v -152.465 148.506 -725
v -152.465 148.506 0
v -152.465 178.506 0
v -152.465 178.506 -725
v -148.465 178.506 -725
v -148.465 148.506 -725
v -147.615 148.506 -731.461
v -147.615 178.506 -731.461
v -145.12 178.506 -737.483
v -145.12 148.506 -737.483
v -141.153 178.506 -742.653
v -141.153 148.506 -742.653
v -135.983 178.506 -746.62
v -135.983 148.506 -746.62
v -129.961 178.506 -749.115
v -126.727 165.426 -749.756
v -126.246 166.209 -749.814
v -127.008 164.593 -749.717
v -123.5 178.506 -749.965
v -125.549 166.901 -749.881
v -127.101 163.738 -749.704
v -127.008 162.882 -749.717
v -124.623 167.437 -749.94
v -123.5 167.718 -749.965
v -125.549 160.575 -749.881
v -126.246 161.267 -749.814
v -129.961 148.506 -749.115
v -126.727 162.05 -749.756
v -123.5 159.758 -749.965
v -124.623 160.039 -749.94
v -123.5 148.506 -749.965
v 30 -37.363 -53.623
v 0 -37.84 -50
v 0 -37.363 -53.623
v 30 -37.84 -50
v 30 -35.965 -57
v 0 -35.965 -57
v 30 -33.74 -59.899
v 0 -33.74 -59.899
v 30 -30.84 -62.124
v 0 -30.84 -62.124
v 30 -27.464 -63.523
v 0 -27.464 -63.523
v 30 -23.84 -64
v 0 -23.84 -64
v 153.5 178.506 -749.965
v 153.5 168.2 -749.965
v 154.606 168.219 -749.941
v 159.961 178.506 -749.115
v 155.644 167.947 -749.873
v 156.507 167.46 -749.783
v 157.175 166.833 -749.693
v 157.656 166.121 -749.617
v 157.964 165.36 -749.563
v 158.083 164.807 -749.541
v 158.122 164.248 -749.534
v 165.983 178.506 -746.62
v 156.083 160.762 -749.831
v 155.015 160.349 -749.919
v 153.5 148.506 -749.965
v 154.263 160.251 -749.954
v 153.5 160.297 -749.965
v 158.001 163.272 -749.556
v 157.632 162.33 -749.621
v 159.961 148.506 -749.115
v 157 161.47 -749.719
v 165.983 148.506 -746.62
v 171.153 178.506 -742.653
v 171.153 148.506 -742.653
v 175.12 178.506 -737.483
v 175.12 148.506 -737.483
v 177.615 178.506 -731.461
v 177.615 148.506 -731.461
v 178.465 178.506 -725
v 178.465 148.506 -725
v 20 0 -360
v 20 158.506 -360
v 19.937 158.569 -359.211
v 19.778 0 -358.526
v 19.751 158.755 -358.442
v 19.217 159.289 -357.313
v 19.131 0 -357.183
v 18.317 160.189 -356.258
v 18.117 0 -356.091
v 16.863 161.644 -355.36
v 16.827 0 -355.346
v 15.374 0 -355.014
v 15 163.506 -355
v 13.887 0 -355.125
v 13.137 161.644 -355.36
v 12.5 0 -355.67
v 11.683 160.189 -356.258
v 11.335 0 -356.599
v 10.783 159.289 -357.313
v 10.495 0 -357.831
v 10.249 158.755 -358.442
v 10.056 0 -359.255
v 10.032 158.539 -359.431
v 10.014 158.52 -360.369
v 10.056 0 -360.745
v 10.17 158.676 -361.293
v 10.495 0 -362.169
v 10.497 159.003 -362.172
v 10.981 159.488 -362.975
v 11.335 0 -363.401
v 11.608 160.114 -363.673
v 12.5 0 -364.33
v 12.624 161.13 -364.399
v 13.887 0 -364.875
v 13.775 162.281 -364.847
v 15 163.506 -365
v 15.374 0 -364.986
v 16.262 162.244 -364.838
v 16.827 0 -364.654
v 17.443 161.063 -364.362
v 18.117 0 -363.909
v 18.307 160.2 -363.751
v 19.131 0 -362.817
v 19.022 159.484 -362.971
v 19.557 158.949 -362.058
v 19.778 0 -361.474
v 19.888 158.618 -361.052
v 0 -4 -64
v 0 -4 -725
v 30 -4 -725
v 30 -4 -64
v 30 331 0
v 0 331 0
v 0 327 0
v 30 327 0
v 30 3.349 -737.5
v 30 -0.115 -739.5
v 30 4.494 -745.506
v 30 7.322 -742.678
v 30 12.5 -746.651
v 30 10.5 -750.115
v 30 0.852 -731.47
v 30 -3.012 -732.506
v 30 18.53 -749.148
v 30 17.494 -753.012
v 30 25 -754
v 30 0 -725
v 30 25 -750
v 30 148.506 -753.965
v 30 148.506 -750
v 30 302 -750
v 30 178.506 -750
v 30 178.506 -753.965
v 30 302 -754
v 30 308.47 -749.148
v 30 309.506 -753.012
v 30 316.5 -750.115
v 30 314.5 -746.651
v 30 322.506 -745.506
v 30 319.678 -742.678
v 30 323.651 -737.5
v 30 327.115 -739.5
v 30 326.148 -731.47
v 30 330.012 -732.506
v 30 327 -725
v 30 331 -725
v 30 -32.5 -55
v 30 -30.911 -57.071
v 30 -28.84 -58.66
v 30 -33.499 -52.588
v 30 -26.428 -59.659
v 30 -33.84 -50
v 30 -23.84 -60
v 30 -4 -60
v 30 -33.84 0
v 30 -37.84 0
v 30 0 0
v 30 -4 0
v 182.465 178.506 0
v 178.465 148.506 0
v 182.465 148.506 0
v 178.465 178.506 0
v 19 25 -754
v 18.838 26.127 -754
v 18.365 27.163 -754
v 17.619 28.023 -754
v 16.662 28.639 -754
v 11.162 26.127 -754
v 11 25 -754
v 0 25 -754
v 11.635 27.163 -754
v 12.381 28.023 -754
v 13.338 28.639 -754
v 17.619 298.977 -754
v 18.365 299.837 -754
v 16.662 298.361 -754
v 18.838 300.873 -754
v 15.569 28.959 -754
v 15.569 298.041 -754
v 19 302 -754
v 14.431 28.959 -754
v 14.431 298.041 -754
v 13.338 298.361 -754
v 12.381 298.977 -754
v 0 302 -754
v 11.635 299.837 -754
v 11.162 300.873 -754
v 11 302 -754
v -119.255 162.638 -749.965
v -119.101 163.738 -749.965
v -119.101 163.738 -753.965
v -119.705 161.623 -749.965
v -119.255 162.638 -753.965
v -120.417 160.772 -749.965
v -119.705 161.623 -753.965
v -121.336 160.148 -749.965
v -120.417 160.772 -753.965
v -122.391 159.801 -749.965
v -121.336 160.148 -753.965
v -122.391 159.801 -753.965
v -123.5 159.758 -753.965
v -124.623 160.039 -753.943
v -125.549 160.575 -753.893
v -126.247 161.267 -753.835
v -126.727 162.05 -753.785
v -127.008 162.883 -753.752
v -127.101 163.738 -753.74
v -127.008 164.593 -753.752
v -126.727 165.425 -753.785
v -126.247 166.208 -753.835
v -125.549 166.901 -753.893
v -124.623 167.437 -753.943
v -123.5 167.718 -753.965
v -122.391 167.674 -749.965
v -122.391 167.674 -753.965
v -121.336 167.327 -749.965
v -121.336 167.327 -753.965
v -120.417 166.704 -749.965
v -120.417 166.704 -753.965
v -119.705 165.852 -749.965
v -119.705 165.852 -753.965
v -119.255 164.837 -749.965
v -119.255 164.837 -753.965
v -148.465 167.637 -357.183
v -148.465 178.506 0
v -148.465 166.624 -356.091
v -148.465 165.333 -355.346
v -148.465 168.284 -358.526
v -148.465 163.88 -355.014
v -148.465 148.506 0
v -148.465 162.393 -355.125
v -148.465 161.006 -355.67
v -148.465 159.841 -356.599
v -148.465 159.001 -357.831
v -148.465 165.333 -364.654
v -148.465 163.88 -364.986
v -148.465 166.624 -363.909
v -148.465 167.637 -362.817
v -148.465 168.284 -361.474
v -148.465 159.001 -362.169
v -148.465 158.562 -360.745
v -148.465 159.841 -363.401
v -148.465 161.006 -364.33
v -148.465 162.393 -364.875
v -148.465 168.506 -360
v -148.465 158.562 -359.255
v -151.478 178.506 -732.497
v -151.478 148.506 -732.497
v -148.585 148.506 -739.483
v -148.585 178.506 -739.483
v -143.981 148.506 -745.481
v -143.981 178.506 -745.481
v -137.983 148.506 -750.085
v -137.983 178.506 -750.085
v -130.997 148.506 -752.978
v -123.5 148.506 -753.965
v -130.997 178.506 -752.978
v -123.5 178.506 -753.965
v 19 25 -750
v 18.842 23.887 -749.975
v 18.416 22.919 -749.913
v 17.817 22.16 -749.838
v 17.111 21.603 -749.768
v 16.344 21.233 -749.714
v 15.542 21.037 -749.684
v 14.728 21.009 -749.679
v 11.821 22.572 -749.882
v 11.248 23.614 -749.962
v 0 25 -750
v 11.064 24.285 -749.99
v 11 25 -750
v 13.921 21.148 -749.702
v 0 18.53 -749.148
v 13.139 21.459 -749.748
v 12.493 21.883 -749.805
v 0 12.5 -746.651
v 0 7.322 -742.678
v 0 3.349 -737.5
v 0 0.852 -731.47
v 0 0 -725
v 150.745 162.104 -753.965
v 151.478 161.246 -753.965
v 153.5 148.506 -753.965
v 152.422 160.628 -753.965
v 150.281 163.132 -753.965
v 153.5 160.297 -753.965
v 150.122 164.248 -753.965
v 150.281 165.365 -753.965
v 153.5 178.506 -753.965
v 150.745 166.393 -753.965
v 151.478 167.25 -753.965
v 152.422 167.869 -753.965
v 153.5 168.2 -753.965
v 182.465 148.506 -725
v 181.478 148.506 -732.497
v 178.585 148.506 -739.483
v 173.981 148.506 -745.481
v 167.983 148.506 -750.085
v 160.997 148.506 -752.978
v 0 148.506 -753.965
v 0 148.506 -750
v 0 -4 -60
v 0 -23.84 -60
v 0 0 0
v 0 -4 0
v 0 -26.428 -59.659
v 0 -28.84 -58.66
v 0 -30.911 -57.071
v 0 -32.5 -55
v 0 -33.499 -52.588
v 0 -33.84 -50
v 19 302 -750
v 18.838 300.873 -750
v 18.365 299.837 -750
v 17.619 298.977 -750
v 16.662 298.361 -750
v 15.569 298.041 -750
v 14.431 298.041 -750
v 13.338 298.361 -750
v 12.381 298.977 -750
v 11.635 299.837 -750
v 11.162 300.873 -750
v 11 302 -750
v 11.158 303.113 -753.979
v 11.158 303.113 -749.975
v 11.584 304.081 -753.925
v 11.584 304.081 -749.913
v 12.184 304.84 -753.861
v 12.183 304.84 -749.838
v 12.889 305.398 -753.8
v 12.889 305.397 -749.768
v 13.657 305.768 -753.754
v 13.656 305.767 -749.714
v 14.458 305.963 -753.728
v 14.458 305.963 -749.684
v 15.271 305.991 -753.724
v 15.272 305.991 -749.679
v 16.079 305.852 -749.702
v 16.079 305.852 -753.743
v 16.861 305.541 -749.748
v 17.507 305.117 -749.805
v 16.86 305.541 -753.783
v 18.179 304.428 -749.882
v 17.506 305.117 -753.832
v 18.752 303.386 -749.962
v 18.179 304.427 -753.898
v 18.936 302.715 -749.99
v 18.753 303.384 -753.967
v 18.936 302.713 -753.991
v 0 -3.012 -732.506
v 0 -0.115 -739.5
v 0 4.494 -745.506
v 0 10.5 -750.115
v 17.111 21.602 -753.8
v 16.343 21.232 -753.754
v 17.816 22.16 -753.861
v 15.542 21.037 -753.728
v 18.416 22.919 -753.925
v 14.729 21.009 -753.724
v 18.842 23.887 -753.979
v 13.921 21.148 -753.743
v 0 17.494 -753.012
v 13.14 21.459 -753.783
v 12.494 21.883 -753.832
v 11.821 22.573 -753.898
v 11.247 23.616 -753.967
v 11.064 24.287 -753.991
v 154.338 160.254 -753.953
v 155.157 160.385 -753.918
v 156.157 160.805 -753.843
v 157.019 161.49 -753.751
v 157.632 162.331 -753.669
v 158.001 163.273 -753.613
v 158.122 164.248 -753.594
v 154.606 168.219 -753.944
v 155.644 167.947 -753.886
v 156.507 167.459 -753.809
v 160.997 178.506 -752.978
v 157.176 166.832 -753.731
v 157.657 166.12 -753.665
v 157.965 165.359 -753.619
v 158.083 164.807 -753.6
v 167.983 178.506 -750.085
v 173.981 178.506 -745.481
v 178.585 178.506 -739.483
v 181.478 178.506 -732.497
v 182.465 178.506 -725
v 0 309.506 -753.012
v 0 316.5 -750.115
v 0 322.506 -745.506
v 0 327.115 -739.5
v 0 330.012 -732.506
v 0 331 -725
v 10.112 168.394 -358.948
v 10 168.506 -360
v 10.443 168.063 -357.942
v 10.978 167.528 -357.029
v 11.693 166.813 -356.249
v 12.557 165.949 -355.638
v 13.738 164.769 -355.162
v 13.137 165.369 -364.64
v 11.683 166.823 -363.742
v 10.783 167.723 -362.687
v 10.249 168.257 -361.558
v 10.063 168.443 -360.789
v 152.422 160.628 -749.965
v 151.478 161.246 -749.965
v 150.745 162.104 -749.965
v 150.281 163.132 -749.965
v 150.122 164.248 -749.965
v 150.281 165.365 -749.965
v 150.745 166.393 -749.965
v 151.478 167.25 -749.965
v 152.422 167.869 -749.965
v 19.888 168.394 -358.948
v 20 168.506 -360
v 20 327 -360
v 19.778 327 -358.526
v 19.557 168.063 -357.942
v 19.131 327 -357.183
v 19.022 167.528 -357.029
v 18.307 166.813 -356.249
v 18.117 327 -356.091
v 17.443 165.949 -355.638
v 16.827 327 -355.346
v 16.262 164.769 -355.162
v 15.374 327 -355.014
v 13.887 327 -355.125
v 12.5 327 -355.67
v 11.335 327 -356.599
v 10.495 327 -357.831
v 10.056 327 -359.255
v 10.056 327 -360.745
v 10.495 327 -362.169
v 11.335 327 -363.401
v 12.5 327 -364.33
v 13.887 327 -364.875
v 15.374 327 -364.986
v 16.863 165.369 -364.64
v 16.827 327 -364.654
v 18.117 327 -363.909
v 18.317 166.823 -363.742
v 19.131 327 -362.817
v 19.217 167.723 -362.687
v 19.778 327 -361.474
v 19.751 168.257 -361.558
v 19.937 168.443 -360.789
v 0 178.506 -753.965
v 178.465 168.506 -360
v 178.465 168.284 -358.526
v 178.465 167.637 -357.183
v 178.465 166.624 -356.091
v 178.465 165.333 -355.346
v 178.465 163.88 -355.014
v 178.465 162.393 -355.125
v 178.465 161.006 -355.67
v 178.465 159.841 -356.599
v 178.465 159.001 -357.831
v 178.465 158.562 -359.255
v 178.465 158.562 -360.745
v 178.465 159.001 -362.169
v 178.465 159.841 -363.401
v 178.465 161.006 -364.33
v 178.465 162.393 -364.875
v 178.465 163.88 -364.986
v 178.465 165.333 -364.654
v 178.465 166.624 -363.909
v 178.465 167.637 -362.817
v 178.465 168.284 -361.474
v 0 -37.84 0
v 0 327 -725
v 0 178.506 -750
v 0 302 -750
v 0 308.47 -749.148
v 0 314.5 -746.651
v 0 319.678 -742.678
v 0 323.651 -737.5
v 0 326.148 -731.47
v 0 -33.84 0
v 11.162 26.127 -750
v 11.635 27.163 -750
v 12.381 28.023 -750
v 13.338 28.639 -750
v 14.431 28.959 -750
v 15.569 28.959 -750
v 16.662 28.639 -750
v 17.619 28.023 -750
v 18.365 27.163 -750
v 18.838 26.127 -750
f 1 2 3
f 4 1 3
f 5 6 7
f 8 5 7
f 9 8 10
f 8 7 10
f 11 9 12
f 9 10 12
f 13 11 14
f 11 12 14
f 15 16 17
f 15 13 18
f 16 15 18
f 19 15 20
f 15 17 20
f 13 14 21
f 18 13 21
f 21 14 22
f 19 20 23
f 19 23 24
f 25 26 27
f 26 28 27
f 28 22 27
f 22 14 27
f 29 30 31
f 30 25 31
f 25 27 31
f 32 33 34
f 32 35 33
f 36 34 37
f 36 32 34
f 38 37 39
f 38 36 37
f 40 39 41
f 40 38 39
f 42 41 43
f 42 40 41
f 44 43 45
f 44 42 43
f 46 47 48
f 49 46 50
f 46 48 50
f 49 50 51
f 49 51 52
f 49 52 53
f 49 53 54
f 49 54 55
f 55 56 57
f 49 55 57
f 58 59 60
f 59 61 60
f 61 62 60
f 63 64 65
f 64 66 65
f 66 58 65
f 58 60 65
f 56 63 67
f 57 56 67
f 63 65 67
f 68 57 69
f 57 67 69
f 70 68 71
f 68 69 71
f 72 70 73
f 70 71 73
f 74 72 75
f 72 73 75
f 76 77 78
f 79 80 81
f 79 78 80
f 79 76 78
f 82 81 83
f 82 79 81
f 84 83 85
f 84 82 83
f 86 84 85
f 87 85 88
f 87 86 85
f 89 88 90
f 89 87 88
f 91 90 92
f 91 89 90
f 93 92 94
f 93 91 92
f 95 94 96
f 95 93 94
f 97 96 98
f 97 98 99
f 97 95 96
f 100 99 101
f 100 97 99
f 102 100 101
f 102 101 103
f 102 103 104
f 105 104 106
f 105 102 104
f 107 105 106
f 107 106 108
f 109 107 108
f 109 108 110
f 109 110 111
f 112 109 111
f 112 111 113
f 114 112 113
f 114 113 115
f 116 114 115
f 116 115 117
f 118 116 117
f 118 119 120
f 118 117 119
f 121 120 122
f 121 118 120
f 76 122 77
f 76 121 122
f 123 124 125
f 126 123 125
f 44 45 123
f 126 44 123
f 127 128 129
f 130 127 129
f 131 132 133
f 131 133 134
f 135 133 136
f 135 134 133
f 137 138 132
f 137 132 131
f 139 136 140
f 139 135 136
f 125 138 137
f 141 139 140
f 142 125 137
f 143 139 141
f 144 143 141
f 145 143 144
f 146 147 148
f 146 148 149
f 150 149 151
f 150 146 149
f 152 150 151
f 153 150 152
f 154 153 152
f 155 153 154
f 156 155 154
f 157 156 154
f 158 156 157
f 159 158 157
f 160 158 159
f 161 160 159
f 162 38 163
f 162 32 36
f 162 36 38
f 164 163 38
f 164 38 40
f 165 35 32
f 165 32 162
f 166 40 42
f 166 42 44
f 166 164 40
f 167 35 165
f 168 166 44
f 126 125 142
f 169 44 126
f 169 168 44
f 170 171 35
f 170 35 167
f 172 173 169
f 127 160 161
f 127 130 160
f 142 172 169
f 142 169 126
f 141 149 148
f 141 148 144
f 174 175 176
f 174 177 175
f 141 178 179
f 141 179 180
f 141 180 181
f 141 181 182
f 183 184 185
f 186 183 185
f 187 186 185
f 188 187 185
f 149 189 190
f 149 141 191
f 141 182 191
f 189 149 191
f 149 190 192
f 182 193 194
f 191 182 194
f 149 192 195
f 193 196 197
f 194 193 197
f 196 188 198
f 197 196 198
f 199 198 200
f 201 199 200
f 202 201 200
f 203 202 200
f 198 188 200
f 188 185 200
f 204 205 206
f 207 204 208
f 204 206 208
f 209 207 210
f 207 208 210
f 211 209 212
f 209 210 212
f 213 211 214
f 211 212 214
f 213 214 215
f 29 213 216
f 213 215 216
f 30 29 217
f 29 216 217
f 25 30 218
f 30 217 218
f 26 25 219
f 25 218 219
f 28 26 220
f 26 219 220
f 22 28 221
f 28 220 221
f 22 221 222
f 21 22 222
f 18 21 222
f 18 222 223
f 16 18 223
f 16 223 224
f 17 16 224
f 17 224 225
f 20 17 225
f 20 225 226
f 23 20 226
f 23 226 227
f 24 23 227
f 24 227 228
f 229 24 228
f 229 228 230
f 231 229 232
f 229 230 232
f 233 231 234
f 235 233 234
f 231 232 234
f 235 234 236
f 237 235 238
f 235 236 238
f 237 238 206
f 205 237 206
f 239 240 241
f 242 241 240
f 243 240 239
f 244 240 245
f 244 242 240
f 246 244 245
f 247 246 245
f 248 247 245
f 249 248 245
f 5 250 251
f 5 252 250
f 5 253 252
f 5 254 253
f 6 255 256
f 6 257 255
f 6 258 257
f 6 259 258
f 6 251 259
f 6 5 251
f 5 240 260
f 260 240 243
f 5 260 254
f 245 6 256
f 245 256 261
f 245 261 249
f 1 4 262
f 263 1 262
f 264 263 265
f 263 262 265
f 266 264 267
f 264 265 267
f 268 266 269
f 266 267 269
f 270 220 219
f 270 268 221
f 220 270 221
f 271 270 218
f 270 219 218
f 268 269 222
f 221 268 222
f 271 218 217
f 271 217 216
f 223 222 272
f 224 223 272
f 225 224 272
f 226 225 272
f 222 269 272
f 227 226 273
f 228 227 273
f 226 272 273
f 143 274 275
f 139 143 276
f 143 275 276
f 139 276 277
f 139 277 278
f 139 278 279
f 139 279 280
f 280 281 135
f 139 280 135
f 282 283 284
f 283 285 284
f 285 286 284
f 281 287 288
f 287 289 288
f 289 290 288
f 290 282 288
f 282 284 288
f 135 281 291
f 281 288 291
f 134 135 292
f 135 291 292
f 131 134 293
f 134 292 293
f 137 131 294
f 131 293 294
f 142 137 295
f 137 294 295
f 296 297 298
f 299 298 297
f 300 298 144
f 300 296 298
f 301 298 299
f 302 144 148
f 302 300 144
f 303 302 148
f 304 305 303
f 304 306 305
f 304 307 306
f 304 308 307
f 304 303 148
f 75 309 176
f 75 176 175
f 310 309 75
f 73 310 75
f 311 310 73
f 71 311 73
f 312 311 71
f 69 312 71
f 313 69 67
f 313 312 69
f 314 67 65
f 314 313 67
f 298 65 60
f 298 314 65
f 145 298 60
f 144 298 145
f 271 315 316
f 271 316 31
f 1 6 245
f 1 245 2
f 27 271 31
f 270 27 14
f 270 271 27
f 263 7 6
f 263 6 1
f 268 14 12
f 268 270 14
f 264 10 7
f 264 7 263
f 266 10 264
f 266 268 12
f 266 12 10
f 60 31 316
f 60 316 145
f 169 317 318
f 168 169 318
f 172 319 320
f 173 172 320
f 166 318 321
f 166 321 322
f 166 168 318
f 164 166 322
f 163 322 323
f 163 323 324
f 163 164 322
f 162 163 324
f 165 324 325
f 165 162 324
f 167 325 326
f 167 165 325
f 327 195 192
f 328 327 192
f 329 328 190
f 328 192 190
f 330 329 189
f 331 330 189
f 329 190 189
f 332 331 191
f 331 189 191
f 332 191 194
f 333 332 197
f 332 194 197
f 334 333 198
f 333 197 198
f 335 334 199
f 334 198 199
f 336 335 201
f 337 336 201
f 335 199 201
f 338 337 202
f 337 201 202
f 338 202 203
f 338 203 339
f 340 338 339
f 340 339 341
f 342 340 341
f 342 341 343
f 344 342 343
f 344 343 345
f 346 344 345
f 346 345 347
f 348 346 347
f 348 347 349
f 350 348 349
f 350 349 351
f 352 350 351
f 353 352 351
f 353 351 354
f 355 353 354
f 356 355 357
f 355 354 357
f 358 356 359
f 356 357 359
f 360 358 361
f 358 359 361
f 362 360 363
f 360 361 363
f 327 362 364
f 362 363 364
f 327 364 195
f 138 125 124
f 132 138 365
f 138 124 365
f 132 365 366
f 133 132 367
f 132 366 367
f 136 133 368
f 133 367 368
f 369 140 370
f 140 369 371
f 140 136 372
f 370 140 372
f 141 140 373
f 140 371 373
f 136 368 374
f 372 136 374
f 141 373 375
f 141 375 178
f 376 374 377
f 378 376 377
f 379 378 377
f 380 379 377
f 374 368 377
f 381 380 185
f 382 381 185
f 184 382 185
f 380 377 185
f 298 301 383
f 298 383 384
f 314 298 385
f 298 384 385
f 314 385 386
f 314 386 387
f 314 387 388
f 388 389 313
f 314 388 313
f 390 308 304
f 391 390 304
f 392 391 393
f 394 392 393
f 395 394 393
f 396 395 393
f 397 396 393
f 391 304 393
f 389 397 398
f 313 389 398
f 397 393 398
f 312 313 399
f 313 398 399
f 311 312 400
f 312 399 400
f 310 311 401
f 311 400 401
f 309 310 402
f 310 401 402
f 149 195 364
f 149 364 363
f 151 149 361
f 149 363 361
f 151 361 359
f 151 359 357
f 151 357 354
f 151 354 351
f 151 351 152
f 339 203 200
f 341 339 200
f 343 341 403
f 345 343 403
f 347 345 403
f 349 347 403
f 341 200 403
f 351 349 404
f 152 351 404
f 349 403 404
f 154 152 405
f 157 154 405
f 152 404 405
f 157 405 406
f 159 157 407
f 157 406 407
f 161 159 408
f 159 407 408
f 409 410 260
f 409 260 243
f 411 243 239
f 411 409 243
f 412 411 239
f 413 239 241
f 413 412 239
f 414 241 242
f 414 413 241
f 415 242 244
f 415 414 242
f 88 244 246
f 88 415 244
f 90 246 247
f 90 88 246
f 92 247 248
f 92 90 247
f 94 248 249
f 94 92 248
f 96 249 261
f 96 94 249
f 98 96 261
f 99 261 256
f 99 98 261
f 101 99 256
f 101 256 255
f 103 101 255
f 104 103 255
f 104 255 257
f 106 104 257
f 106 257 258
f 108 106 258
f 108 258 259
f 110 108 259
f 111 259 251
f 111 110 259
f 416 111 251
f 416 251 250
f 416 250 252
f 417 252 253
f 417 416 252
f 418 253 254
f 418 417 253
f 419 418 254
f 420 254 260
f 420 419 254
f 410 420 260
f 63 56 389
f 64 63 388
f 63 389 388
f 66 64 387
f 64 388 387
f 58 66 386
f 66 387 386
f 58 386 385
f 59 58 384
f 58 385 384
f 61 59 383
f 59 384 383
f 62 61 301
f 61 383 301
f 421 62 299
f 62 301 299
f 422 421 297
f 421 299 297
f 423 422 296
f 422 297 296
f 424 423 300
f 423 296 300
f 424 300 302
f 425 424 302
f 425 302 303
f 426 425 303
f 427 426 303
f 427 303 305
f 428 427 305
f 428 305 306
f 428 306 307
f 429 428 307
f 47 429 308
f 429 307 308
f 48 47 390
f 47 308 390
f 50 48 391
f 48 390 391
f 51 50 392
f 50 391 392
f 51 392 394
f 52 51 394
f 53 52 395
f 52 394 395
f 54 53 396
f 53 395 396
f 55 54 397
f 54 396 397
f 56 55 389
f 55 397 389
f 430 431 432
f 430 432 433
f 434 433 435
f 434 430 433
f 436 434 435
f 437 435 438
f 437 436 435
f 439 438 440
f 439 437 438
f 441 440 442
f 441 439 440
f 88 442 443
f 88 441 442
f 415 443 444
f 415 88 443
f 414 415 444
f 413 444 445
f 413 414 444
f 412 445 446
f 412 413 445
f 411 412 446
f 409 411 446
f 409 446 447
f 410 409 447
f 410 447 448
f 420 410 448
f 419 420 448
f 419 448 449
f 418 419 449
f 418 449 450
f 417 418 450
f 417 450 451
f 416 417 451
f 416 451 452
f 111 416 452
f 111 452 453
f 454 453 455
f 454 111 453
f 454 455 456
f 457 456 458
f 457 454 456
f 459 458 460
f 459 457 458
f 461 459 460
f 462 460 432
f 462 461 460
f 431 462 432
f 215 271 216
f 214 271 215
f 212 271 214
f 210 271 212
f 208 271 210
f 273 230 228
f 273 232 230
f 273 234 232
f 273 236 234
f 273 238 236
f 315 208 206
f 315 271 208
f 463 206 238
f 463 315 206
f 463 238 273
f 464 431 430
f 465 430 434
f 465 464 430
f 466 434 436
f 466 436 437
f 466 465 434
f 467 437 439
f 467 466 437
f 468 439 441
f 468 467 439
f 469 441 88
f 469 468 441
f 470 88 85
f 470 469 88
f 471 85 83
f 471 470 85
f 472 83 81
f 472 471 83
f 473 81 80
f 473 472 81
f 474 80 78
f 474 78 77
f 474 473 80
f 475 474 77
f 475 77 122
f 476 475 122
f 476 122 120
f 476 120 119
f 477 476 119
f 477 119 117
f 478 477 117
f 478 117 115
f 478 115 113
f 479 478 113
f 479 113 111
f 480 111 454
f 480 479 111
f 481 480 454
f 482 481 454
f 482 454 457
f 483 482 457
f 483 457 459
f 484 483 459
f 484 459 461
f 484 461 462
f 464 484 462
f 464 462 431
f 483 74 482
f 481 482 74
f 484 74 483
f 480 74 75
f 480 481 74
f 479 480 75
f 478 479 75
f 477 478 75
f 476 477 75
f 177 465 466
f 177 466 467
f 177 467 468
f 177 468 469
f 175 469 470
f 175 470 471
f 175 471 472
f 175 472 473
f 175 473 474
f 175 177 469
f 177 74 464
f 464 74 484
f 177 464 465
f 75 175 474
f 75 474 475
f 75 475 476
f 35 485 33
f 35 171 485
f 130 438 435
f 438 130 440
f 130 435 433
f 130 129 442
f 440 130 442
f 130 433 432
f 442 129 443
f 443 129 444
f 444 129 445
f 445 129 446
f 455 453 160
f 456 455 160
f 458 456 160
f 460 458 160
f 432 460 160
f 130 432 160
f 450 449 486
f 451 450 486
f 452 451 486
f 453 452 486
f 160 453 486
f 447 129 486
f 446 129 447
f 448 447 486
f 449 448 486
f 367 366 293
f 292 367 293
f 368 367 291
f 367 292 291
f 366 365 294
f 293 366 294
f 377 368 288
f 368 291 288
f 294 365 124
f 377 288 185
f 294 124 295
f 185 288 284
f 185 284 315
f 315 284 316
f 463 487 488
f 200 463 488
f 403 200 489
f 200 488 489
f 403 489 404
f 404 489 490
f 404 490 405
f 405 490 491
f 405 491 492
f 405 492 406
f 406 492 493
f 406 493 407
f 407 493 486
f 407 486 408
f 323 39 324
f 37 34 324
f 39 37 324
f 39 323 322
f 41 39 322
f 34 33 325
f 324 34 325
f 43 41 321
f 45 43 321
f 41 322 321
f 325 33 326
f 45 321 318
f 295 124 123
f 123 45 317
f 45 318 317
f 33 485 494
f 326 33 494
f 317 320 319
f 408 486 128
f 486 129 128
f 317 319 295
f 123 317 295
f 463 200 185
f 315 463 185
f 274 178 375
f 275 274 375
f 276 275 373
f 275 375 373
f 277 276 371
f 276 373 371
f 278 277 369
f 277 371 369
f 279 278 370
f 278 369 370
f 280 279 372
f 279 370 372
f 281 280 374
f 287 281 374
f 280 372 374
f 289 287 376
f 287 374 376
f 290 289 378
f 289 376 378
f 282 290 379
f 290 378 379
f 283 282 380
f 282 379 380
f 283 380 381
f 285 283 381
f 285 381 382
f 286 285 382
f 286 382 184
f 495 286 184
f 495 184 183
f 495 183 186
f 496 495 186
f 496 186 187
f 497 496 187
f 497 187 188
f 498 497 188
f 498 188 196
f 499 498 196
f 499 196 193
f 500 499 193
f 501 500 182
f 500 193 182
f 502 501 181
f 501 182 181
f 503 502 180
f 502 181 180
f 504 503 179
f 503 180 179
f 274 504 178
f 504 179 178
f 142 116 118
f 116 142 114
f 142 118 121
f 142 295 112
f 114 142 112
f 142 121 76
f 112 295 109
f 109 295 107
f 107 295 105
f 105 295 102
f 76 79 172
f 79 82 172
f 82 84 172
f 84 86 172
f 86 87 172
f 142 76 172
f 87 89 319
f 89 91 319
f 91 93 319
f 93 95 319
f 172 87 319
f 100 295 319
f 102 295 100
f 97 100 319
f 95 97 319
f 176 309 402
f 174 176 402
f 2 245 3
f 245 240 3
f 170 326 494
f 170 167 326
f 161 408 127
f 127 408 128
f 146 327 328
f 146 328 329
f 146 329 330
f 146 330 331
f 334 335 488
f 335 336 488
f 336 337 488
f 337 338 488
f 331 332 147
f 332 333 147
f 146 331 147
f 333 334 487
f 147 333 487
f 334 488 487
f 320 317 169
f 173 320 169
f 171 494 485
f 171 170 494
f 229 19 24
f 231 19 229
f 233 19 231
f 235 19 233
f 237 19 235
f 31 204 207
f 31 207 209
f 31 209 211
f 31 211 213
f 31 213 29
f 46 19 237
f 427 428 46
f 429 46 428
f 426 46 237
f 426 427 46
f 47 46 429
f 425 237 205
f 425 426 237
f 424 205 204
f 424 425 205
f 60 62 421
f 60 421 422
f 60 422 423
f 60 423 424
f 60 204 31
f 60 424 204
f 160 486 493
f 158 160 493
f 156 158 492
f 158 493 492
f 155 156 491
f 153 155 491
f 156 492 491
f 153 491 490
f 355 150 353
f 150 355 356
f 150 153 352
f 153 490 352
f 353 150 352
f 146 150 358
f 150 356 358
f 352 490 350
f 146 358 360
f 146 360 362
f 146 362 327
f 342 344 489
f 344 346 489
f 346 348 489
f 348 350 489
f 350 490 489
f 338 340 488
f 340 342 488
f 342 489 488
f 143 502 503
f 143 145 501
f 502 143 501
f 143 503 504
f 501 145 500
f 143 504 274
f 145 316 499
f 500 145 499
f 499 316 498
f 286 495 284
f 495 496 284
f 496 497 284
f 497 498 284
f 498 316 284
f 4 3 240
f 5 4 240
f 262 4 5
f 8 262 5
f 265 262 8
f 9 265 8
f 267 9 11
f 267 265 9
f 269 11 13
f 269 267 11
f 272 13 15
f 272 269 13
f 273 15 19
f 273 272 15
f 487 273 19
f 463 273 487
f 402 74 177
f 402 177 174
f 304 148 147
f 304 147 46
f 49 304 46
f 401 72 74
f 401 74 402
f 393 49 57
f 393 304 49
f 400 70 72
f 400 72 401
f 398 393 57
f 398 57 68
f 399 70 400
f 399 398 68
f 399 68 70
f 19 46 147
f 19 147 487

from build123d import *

# Parameters (mm, degrees)
F1_DEPTH       = 30
F4_W           = 30
F4_H           = 4
F7_R           = 5
F8_DEPTH       = 334
F9_R           = 5
F10_DEPTH      = 334
F11_R          = 4
F12_DEPTH      = 25
F14_DEPTH      = 15
F14_DEPTH_BACK = 15


with BuildPart() as f1:
    # F0 (on Right) → F1 (new body)
    with BuildSketch(Plane.YZ):
        with BuildLine():
            Line((0, -725), (0, 0))
            Line((0, 0), (-4, 0))
            Line((-4, 0), (-4, -725))
            ThreePointArc((-4, -725), (4.4939033456, -745.5060966544), (25, -754))
            Line((25, -754), (302, -754))
            ThreePointArc((302, -754), (322.5060966544, -745.5060966544), (331, -725))
            Line((331, -725), (331, 0))
            Line((331, 0), (327, 0))
            Line((327, 0), (327, -725))
            ThreePointArc((327, -725), (319.6776695297, -742.6776695297), (302, -750))
            Line((302, -750), (25, -750))
            ThreePointArc((25, -750), (7.3223304703, -742.6776695297), (0, -725))
        make_face()
    extrude(amount=F1_DEPTH)

    # F6: sweep along a path in F5
    with BuildLine(Plane.XZ.offset(-148.5)) as f6_path:
        Line((-148.5, 0), (-148.5, -725))
        ThreePointArc((-148.5, -725), (-141.1776695297, -742.6776695297), (-123.5, -750))
        Line((-123.5, -750), (153.5, -750))
        ThreePointArc((153.5, -750), (171.1776695297, -742.6776695297), (178.5, -725))
        Line((178.5, -725), (178.5, 0))
    # F4 (on offset) → F6 (sweep)
    with BuildSketch(Plane.YZ.offset(15)):
        with Locations((163.5060608387, -751.9651731714)):
            Rectangle(F4_W, F4_H)
    sweep(path=f6_path.line)

    # F7 (on face) → F8 (join)
    with BuildSketch(Plane.YZ.offset(182.4651731714)):
        with Locations((163.5060608387, -360)):
            Circle(F7_R)
    extrude(amount=-F8_DEPTH)

    # F9 (on face) → F10 (join)
    with BuildSketch(Plane.XZ.offset(4)):
        with Locations((15, -360)):
            Circle(F9_R)
    extrude(amount=-F10_DEPTH)

    # F11 (on face) → F12 (cut)
    with BuildSketch(Plane(origin=(0, 0, -754), x_dir=(1, 0, 0), z_dir=(0, 0, -1))):
        with Locations((15, -25)):
            Circle(F11_R)
        with Locations((15, -302)):
            Circle(F11_R)
        with Locations((-123.1007874012, -163.7377291918)):
            Circle(F11_R)
        with Locations((154.1218459606, -164.2482578754)):
            Circle(F11_R)
    extrude(amount=-F12_DEPTH, mode=Mode.SUBTRACT)

    # F13 (on offset) → F14 (join, two sides)
    with BuildSketch(Plane.YZ.offset(15)) as f14_sk:
        with BuildLine():
            Line((-3.8402353227, -64), (-3.8402353227, -60))
            Line((-3.8402353227, -60), (-23.8402353227, -60))
            ThreePointArc((-23.8402353227, -60), (-30.9113031346, -57.0710678119), (-33.8402353227, -50))
            Line((-33.8402353227, -50), (-33.8402353227, 0))
            Line((-33.8402353227, 0), (-37.8402353227, 0))
            Line((-37.8402353227, 0), (-37.8402353227, -50))
            ThreePointArc((-37.8402353227, -50), (-33.7397302593, -59.8994949366), (-23.8402353227, -64))
            Line((-23.8402353227, -64), (-3.8402353227, -64))
        make_face()
    extrude(amount=F14_DEPTH)
    extrude(f14_sk.sketch, amount=-F14_DEPTH_BACK)


solid = f1.part
